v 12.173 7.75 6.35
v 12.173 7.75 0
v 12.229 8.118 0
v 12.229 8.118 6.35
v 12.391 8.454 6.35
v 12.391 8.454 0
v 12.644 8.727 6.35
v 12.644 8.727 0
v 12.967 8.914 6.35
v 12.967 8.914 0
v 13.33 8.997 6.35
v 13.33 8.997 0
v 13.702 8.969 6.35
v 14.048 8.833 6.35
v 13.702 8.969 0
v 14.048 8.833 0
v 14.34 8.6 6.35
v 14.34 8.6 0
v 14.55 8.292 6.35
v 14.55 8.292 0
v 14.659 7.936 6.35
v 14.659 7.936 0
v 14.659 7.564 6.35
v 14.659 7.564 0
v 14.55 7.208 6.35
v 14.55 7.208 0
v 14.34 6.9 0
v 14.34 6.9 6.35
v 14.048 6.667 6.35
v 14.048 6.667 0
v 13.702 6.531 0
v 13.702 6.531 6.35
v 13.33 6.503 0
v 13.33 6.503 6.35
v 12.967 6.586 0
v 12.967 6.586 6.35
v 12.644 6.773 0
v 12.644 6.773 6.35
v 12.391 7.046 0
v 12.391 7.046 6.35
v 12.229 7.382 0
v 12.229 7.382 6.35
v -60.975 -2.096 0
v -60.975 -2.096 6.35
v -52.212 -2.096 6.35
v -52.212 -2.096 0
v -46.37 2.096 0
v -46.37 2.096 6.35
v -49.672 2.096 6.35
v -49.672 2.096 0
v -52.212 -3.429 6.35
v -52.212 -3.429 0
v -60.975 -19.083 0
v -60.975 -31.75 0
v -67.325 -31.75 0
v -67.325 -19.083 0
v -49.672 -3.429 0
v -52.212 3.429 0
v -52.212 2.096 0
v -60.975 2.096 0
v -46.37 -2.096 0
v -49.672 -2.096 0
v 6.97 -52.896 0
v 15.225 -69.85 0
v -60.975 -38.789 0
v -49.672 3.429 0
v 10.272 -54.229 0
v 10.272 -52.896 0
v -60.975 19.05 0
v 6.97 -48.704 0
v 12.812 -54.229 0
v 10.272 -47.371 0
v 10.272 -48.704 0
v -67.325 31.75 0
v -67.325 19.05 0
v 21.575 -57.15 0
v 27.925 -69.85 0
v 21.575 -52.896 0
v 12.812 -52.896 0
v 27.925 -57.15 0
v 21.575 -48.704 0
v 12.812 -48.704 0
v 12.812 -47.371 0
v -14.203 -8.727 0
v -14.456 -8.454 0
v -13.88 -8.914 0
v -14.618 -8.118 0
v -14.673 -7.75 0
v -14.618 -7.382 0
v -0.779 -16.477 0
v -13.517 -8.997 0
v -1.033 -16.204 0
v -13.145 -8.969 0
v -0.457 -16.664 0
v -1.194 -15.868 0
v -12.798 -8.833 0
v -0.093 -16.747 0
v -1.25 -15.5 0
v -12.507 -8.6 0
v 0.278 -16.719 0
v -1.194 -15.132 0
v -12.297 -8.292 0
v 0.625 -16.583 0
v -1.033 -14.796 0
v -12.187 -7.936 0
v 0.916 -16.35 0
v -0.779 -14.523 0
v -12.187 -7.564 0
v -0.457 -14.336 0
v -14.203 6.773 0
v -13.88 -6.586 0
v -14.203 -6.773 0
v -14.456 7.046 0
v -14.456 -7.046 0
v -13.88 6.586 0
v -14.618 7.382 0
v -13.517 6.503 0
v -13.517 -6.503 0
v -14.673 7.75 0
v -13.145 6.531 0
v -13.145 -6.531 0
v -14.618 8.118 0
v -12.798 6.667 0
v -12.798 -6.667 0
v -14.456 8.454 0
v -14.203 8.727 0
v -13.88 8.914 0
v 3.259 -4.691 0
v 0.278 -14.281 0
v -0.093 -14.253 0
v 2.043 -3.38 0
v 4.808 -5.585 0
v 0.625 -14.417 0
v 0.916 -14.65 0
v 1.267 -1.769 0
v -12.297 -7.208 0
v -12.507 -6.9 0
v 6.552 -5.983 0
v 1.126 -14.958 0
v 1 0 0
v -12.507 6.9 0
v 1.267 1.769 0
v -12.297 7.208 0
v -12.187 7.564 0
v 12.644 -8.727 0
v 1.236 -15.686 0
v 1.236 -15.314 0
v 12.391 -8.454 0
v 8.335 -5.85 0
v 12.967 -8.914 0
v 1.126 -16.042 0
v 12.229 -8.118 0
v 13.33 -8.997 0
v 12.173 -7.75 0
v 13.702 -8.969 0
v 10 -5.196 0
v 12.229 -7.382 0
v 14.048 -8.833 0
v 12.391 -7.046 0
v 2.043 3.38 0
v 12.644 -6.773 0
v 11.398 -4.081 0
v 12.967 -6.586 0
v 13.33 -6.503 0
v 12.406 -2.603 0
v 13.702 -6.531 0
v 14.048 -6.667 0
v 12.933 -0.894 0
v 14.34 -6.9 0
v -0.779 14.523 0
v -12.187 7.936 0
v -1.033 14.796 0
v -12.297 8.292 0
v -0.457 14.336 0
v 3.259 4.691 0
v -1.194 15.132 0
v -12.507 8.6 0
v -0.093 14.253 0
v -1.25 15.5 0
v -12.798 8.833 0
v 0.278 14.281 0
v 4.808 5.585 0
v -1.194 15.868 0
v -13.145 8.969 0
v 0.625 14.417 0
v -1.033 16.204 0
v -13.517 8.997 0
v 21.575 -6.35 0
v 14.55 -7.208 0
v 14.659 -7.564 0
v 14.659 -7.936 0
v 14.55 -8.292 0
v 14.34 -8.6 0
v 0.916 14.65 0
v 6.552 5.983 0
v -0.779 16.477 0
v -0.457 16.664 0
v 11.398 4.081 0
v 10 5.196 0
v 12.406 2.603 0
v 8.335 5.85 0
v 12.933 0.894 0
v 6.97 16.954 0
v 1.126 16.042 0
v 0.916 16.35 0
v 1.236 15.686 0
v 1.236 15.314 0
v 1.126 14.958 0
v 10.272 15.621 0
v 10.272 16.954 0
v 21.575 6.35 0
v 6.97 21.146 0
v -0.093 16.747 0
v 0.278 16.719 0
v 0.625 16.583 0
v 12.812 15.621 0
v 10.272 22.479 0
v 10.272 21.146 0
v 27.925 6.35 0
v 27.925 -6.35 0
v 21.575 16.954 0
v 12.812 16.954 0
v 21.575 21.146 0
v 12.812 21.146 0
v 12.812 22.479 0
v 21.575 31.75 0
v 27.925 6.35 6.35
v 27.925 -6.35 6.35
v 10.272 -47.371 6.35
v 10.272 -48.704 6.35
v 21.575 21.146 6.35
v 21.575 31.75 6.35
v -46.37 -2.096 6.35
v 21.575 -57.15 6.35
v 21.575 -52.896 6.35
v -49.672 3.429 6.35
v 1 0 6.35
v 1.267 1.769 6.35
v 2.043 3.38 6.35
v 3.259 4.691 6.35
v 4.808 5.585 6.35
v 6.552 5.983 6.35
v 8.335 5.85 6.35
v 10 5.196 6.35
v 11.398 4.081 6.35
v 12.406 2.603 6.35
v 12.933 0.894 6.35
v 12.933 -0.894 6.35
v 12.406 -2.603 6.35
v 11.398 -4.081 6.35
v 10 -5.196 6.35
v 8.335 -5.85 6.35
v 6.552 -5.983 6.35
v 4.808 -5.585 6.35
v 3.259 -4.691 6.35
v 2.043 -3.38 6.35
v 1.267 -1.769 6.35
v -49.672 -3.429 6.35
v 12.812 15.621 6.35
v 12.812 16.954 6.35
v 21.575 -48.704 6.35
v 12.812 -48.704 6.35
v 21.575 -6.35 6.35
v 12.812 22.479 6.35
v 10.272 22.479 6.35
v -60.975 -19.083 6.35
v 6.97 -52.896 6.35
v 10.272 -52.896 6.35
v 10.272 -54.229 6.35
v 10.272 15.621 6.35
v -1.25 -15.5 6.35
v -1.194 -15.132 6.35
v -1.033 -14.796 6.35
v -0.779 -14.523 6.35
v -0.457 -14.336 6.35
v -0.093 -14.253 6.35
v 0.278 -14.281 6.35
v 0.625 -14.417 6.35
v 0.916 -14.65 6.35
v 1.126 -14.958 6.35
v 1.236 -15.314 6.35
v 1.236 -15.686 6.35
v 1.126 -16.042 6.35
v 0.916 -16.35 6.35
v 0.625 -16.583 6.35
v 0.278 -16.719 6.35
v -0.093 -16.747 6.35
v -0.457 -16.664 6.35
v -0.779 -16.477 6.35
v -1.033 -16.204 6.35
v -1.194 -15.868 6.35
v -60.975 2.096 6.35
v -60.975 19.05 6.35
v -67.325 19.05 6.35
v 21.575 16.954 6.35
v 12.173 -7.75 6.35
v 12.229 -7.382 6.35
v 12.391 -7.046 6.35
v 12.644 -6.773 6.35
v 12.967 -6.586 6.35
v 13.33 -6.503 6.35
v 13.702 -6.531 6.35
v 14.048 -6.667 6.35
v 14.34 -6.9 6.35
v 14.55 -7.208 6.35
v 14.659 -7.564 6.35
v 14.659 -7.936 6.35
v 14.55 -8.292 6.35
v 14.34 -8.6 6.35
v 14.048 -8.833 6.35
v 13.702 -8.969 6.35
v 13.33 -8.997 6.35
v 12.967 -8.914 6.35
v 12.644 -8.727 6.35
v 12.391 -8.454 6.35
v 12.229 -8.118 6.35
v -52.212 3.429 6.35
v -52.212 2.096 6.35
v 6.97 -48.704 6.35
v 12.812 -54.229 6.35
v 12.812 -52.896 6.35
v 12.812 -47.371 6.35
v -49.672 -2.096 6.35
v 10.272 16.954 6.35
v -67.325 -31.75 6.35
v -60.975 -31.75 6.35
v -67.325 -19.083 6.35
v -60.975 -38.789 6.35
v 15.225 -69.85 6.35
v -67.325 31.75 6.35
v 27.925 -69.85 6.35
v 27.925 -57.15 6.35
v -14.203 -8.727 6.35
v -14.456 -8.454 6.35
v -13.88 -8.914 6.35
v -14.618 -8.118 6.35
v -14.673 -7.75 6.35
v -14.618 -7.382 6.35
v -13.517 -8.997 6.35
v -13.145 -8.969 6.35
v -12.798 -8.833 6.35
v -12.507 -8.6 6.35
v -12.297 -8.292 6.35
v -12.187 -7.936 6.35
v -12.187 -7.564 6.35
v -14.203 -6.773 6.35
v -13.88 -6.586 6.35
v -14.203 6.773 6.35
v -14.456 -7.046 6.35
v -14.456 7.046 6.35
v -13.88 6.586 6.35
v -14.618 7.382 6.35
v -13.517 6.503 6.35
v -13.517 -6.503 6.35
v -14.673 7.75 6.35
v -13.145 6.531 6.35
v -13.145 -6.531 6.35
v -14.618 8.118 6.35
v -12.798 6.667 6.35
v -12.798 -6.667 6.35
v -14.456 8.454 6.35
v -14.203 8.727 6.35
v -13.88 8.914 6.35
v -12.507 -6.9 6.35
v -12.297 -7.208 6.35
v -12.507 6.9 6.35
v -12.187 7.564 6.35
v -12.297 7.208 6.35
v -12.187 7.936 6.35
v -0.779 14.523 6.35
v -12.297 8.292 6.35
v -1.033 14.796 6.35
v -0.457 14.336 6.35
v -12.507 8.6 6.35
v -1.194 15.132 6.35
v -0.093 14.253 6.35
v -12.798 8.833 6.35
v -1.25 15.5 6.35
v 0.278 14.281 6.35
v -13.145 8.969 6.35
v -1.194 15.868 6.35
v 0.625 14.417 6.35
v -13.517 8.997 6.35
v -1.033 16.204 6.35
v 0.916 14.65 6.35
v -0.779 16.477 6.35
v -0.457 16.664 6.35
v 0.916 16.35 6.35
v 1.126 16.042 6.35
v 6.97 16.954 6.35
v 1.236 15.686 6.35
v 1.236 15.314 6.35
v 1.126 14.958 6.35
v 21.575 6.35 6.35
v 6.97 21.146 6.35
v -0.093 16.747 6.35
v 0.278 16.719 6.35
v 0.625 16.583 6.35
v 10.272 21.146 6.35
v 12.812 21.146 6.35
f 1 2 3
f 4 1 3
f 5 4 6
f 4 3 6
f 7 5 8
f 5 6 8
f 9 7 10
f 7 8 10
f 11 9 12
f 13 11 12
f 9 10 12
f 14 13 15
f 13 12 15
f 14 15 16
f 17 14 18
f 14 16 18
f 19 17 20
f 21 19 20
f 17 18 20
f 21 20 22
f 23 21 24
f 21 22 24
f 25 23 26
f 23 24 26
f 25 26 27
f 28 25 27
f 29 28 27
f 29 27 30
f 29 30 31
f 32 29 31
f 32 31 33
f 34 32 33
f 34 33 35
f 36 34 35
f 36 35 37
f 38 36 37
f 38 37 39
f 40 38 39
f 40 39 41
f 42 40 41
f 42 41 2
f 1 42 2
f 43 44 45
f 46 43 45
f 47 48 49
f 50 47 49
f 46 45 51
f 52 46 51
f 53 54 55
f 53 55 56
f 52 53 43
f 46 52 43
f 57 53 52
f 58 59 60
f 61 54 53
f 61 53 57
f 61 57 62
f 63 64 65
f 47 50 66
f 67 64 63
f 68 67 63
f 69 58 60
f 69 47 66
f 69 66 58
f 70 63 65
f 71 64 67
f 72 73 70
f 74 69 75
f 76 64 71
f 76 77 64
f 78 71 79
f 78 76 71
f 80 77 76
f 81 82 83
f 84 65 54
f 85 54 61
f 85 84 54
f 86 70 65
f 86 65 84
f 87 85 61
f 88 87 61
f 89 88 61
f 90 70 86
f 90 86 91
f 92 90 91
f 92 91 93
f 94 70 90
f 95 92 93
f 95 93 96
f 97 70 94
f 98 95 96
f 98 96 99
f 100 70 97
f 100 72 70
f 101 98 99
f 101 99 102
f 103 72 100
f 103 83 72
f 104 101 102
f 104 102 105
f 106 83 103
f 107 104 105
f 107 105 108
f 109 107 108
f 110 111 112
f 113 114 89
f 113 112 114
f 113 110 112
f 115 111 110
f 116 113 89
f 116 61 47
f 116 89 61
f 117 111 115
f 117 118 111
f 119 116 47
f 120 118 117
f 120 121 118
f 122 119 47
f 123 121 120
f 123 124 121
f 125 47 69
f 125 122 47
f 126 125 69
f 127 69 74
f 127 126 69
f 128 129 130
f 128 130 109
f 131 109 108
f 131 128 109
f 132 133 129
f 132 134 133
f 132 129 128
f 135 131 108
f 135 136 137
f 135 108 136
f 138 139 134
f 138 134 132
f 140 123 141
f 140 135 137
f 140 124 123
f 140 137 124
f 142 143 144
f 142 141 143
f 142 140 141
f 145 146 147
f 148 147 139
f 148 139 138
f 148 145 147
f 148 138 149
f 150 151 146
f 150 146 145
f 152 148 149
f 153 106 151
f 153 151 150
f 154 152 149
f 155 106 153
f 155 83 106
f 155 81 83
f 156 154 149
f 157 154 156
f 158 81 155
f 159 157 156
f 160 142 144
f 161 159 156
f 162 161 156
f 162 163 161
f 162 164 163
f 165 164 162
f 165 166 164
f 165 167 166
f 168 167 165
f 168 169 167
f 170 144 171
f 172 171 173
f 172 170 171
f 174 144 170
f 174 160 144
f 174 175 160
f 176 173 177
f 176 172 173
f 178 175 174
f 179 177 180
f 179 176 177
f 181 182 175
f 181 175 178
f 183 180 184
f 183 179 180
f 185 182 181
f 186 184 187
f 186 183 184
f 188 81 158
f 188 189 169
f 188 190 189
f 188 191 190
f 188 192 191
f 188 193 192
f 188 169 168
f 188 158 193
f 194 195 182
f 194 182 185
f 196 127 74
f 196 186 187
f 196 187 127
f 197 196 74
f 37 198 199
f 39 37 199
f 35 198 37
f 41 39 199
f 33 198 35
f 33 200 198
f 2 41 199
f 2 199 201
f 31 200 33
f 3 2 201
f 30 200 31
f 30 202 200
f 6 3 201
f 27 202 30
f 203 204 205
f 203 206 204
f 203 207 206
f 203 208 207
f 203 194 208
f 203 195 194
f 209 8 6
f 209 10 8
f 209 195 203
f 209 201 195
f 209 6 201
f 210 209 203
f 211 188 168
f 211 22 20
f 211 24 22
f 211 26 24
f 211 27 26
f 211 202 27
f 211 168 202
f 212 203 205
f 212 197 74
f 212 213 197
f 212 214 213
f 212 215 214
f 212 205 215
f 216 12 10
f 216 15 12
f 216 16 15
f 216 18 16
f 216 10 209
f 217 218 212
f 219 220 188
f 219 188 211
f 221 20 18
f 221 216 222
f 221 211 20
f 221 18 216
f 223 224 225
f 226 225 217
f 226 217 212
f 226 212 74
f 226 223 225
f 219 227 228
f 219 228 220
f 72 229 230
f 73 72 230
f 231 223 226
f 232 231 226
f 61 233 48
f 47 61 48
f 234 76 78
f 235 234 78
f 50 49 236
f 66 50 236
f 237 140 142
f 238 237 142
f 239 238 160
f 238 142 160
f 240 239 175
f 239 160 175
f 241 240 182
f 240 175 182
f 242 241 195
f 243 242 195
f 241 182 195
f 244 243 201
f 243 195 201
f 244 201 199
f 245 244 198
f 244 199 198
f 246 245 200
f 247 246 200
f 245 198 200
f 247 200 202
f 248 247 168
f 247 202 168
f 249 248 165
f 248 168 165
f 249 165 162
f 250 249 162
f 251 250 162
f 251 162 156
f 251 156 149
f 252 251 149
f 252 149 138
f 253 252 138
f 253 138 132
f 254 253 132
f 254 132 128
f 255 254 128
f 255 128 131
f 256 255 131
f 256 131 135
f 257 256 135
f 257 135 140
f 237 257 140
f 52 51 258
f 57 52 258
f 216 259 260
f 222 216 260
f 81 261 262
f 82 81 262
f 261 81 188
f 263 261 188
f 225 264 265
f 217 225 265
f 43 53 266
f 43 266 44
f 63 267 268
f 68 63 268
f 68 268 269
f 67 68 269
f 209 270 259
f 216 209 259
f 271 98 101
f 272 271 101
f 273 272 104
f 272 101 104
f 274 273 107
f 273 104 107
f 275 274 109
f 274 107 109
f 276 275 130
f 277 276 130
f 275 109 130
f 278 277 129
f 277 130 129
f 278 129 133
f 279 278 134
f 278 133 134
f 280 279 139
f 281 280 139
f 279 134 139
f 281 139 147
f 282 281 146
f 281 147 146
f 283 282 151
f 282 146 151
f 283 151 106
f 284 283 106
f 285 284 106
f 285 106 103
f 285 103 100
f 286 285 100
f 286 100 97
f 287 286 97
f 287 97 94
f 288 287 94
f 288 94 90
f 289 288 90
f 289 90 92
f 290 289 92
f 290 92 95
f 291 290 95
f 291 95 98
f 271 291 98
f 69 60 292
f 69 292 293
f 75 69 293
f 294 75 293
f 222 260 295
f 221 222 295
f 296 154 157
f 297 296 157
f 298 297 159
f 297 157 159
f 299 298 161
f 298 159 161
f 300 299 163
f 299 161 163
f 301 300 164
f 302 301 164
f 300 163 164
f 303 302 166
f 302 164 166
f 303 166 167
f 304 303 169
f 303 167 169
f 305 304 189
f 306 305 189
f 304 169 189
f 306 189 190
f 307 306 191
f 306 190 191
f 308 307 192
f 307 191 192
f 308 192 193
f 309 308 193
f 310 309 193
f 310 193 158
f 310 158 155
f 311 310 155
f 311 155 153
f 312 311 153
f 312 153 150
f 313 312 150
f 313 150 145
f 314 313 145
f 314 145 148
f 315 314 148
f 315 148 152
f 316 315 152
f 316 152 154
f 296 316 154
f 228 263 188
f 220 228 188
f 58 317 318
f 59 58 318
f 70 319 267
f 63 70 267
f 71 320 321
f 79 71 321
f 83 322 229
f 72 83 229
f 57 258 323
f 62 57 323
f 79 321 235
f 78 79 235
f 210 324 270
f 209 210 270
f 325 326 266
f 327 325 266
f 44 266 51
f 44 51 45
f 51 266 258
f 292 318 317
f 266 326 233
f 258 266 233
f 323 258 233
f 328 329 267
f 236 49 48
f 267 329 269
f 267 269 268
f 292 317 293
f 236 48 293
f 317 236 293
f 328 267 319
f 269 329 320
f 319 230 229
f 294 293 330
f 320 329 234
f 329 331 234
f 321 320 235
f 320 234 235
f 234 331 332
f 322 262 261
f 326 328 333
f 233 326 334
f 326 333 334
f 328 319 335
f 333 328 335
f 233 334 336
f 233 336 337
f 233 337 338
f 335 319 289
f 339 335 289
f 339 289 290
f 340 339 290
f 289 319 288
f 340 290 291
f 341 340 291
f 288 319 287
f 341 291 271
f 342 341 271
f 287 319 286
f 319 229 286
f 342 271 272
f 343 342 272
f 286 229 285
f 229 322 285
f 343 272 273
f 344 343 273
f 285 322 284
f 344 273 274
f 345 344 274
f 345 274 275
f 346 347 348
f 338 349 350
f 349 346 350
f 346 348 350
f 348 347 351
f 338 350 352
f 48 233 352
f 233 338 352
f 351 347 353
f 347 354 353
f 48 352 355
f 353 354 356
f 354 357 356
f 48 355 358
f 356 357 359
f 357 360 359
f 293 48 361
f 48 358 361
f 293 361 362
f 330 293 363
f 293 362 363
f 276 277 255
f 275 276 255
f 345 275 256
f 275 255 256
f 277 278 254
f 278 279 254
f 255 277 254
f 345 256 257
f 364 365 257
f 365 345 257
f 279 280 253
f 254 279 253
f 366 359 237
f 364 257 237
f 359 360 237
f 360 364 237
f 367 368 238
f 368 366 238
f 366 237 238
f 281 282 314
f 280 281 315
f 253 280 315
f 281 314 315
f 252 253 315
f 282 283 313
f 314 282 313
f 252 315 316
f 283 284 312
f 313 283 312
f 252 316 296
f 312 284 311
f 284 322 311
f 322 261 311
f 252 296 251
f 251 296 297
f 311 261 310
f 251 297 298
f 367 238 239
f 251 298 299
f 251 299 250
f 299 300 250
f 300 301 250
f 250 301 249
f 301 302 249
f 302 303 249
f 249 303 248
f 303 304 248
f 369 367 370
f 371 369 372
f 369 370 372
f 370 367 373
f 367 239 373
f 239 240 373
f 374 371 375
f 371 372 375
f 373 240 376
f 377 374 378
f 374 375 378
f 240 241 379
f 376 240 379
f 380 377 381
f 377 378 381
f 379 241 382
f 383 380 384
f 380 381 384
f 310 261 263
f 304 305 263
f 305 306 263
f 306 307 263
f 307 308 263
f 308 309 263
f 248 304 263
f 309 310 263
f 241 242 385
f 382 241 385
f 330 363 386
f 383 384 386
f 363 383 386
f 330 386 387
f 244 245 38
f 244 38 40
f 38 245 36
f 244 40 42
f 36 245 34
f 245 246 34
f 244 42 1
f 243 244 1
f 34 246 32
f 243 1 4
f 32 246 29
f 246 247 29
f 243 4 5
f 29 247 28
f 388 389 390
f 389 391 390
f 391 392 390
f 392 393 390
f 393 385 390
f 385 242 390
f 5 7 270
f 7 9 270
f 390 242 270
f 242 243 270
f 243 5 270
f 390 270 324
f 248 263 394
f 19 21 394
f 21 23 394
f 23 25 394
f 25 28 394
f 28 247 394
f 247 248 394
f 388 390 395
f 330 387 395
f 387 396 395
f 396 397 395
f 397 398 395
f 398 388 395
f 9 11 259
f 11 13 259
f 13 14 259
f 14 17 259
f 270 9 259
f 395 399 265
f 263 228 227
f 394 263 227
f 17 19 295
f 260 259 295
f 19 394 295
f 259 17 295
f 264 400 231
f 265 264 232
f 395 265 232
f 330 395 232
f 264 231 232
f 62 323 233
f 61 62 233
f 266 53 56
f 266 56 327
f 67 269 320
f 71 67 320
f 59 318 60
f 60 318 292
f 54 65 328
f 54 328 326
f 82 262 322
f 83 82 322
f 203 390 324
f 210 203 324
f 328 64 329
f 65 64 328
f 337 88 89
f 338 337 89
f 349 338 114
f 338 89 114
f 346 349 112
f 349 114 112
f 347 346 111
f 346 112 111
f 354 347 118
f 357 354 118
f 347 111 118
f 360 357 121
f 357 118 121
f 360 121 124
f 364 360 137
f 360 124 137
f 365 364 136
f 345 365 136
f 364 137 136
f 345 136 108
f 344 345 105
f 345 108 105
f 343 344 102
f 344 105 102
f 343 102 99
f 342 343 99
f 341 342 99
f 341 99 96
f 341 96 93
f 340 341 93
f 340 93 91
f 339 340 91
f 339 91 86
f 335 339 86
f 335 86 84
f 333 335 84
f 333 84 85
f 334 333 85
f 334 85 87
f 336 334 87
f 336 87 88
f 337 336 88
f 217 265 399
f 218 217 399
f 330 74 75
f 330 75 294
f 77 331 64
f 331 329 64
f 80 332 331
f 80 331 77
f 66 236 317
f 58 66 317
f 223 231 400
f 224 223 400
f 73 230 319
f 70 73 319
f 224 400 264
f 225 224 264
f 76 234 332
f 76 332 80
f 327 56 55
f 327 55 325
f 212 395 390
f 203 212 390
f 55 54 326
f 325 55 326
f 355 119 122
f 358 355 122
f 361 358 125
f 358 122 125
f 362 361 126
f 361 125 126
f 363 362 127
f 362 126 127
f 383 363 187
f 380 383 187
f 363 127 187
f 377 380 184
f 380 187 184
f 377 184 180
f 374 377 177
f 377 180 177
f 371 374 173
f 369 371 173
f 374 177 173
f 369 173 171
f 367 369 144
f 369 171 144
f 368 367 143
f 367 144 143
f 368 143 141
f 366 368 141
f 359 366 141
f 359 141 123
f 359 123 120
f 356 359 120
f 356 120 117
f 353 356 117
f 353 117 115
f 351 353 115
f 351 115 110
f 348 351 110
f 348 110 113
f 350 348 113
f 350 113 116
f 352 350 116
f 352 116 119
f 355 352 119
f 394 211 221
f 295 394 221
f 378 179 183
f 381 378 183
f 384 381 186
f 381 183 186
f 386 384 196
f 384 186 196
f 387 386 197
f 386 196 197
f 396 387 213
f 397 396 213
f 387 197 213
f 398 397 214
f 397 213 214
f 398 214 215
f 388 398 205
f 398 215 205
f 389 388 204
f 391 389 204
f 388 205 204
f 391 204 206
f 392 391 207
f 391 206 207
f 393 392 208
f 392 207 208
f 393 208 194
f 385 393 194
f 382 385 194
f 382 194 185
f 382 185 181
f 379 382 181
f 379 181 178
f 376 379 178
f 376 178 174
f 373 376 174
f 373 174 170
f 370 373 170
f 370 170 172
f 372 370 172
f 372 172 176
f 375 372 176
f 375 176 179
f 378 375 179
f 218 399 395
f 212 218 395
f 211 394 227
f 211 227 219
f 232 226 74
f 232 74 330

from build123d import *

# Parameters (mm, degrees)
BOSS_EXTRUDE1_DEPTH = 6.35
SKETCH2_W           = 6.35
SKETCH2_H           = 12.7
BOSS_EXTRUDE2_DEPTH = 6.35
LPATTERN1_COUNT     = 2
LPATTERN1_PITCH     = 63.5
SKETCH3_R           = 1.25
SKETCH3_R_2         = 6
CUT_EXTRUDE1_DEPTH  = 93.937051949
SKETCH4_W           = 6.35
SKETCH4_H           = 12.7
SKETCH4_H_2         = 12.666633789
BOSS_EXTRUDE3_DEPTH = 6.35
CUT_EXTRUDE2_DEPTH  = 98.221400036


with BuildPart() as part:
    # Sketch1 → Boss-Extrude1 (new body)
    with BuildSketch(Plane.XY):
        Polygon((-60.975, 31.75), (21.575, 31.75), (21.575, -38.788945114), (21.575, -69.85), (15.225, -69.85), (-60.975, -38.788945114), align=None)
    extrude(amount=BOSS_EXTRUDE1_DEPTH)

    # Sketch2 → Boss-Extrude2 (add)
    with BuildSketch(Plane(origin=(21.575, 0, 0), x_dir=(0, 0, -1), z_dir=(1, 0, 0))):
        with Locations((-3.175, -63.5)):
            Rectangle(SKETCH2_W, SKETCH2_H)
    boss_extrude2 = extrude(amount=BOSS_EXTRUDE2_DEPTH)

    # LPattern1: Boss-Extrude2 ×2
    with Locations(*[(0, i * LPATTERN1_PITCH, 0) for i in range(1, LPATTERN1_COUNT)]):
        add(boss_extrude2)

    # Sketch3 → Cut-Extrude1 (cut, through all)
    with BuildSketch(Plane(origin=(0, 0, 0), x_dir=(-1, 0, 0), z_dir=(0, 0, -1))):
        with Locations((13.423393759, 7.75)):
            Circle(SKETCH3_R)
        with Locations((13.423393759, -7.75)):
            Circle(SKETCH3_R)
        with Locations((0, 15.5)):
            Circle(SKETCH3_R)
        with Locations((-13.423393759, 7.75)):
            Circle(SKETCH3_R)
        with Locations((-13.423393759, -7.75)):
            Circle(SKETCH3_R)
        with Locations((0, -15.5)):
            Circle(SKETCH3_R)
        with Locations((-7, 0)):
            Circle(SKETCH3_R_2)
    extrude(amount=-CUT_EXTRUDE1_DEPTH, mode=Mode.SUBTRACT)

    # Sketch4 → Boss-Extrude3 (add)
    with BuildSketch(Plane.ZY.offset(60.975)):
        with Locations((3.175, 25.4)):
            Rectangle(SKETCH4_W, SKETCH4_H)
        with Locations((3.175, -25.416683106)):
            Rectangle(SKETCH4_W, SKETCH4_H_2)
    extrude(amount=BOSS_EXTRUDE3_DEPTH)

    # Sketch5 → Cut-Extrude2 (cut, through all)
    with BuildSketch(Plane.XY.offset(6.35)):
        Polygon((-60.975, 2.0955), (-60.975, -2.0955), (-52.212, -2.0955), (-52.212, -3.429), (-49.672, -3.429), (-49.672, -2.0955), (-46.37, -2.0955), (-46.37, 2.0955), (-49.672, 2.0955), (-49.672, 3.429), (-52.212, 3.429), (-52.212, 2.0955), align=None)
        Polygon((21.575, -52.8955), (21.575, -48.7045), (12.812, -48.7045), (12.812, -47.371), (10.272, -47.371), (10.272, -48.7045), (6.97, -48.7045), (6.97, -52.8955), (10.272, -52.8955), (10.272, -54.229), (12.812, -54.229), (12.812, -52.8955), align=None)
        Polygon((21.575, 16.9545), (21.575, 21.1455), (12.812, 21.1455), (12.812, 22.479), (10.272, 22.479), (10.272, 21.1455), (6.97, 21.1455), (6.97, 16.9545), (10.272, 16.9545), (10.272, 15.621), (12.812, 15.621), (12.812, 16.9545), align=None)
    extrude(amount=-CUT_EXTRUDE2_DEPTH, mode=Mode.SUBTRACT)


solid = part.part
